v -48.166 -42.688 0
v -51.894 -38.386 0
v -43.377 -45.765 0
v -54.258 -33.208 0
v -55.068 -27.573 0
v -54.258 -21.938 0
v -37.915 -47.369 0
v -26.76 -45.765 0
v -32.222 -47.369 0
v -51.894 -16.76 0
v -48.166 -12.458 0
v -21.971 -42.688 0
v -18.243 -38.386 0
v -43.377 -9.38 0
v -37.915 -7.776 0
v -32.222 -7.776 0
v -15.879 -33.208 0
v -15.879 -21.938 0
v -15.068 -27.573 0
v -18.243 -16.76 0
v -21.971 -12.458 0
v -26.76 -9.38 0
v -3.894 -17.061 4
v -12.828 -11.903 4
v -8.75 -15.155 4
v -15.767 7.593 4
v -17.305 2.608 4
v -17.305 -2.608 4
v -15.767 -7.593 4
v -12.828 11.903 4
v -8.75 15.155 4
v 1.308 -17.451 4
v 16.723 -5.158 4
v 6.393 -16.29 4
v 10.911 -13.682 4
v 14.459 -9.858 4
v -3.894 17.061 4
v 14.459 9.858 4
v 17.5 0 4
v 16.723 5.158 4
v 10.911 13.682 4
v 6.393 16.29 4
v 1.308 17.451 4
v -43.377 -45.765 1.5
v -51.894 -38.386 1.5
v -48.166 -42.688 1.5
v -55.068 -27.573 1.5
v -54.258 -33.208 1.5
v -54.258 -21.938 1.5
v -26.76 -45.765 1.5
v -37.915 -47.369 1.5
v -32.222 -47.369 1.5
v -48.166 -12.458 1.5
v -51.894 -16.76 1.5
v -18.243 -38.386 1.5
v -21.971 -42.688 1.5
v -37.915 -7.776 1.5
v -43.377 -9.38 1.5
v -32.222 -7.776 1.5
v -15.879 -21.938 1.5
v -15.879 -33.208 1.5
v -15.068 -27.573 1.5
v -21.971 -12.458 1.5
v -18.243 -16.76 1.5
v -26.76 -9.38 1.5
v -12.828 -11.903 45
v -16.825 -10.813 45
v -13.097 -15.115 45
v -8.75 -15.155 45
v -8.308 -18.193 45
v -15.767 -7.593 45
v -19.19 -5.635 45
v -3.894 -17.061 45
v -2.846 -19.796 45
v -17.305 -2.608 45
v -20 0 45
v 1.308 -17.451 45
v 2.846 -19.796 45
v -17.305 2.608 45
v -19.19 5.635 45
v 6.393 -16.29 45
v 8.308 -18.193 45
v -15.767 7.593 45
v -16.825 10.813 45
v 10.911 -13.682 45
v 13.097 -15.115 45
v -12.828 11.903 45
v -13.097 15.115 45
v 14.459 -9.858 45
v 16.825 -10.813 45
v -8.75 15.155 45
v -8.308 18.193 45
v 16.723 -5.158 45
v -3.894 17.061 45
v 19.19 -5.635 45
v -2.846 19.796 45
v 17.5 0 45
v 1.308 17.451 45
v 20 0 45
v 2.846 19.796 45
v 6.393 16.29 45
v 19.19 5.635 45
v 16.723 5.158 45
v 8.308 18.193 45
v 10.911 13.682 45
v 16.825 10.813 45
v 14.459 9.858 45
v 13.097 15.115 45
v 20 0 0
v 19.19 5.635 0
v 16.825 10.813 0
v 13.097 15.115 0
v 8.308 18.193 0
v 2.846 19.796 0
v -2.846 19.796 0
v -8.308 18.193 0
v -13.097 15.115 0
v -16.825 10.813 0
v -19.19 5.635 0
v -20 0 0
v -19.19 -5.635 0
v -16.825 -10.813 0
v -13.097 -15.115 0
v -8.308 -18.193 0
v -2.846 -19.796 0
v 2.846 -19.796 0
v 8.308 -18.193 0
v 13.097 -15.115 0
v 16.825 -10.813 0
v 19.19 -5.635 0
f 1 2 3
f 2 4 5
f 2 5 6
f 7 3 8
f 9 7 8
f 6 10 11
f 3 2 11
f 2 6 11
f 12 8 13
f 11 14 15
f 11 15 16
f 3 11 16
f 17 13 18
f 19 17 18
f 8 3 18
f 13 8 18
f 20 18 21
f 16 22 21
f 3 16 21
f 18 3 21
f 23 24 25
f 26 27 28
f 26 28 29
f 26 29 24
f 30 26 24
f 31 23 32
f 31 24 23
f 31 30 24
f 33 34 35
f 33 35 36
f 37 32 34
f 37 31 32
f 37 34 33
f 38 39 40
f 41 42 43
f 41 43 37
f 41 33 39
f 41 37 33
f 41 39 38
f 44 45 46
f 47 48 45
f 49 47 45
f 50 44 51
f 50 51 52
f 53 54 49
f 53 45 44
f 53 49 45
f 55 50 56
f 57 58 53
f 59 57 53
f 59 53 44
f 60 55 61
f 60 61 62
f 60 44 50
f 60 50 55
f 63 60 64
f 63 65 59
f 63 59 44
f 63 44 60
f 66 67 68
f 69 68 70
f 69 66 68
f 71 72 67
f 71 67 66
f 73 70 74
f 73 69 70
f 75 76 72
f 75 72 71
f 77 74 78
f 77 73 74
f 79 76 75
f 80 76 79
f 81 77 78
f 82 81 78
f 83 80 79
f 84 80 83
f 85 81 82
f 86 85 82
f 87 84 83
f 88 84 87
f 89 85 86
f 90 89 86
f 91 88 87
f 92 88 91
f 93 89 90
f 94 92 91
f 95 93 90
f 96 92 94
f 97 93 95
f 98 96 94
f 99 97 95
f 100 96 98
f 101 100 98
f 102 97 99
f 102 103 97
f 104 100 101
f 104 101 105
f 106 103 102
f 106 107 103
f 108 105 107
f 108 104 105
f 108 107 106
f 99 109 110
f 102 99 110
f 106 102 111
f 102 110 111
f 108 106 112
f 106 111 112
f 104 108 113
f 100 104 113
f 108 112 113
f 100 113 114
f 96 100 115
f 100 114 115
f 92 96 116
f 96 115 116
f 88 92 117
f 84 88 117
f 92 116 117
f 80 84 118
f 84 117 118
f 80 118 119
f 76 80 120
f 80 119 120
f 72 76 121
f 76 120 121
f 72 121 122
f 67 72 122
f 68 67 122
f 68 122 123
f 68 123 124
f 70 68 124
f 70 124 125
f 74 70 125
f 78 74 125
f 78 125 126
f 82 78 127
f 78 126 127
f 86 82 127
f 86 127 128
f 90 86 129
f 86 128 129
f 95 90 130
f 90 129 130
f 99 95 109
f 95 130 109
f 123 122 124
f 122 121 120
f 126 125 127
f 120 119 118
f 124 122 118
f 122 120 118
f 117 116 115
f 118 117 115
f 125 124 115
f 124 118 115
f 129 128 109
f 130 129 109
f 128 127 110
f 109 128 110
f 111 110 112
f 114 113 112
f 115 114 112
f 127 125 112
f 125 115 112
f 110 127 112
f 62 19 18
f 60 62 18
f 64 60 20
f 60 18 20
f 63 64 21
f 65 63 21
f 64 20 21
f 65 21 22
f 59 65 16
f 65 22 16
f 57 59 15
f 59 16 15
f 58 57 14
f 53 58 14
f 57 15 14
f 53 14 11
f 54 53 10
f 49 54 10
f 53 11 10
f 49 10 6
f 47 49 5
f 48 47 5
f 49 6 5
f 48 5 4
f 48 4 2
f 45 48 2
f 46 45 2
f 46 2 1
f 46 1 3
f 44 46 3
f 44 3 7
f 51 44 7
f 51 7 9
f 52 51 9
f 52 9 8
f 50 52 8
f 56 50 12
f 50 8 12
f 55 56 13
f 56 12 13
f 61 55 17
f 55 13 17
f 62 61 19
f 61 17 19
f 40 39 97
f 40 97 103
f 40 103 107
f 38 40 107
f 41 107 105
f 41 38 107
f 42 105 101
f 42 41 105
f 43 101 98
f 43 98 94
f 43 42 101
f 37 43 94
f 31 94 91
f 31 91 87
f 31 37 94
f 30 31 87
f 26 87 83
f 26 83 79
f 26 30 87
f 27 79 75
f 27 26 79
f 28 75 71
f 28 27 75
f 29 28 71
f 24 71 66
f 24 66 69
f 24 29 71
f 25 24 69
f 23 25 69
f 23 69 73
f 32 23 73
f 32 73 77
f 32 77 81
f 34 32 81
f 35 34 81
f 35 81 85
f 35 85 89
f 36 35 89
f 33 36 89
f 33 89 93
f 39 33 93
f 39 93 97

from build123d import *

# Parameters (mm, degrees)
F0_R     = 20
F1_DEPTH = 1.5
F0_R_2   = 17.5
F2_DEPTH = 4
F3_DEPTH = 45


with BuildPart() as f1:
    # F0 (on Top) → F1 (new body)
    with BuildSketch(Plane.XY):
        with Locations((-35.068445, -27.572853)):
            Circle(F0_R)
    extrude(amount=F1_DEPTH)


with BuildPart() as f2:
    # F0 (on Top) → F2 (new body)
    with BuildSketch(Plane.XY):
        Circle(F0_R_2)
    extrude(amount=F2_DEPTH)

    # F0 (on Top) → F3 (join)
    with BuildSketch(Plane.XY):
        Circle(F0_R)
        Circle(F0_R_2, mode=Mode.SUBTRACT)
    extrude(amount=F3_DEPTH)


solid = Compound([f1.part, f2.part])
